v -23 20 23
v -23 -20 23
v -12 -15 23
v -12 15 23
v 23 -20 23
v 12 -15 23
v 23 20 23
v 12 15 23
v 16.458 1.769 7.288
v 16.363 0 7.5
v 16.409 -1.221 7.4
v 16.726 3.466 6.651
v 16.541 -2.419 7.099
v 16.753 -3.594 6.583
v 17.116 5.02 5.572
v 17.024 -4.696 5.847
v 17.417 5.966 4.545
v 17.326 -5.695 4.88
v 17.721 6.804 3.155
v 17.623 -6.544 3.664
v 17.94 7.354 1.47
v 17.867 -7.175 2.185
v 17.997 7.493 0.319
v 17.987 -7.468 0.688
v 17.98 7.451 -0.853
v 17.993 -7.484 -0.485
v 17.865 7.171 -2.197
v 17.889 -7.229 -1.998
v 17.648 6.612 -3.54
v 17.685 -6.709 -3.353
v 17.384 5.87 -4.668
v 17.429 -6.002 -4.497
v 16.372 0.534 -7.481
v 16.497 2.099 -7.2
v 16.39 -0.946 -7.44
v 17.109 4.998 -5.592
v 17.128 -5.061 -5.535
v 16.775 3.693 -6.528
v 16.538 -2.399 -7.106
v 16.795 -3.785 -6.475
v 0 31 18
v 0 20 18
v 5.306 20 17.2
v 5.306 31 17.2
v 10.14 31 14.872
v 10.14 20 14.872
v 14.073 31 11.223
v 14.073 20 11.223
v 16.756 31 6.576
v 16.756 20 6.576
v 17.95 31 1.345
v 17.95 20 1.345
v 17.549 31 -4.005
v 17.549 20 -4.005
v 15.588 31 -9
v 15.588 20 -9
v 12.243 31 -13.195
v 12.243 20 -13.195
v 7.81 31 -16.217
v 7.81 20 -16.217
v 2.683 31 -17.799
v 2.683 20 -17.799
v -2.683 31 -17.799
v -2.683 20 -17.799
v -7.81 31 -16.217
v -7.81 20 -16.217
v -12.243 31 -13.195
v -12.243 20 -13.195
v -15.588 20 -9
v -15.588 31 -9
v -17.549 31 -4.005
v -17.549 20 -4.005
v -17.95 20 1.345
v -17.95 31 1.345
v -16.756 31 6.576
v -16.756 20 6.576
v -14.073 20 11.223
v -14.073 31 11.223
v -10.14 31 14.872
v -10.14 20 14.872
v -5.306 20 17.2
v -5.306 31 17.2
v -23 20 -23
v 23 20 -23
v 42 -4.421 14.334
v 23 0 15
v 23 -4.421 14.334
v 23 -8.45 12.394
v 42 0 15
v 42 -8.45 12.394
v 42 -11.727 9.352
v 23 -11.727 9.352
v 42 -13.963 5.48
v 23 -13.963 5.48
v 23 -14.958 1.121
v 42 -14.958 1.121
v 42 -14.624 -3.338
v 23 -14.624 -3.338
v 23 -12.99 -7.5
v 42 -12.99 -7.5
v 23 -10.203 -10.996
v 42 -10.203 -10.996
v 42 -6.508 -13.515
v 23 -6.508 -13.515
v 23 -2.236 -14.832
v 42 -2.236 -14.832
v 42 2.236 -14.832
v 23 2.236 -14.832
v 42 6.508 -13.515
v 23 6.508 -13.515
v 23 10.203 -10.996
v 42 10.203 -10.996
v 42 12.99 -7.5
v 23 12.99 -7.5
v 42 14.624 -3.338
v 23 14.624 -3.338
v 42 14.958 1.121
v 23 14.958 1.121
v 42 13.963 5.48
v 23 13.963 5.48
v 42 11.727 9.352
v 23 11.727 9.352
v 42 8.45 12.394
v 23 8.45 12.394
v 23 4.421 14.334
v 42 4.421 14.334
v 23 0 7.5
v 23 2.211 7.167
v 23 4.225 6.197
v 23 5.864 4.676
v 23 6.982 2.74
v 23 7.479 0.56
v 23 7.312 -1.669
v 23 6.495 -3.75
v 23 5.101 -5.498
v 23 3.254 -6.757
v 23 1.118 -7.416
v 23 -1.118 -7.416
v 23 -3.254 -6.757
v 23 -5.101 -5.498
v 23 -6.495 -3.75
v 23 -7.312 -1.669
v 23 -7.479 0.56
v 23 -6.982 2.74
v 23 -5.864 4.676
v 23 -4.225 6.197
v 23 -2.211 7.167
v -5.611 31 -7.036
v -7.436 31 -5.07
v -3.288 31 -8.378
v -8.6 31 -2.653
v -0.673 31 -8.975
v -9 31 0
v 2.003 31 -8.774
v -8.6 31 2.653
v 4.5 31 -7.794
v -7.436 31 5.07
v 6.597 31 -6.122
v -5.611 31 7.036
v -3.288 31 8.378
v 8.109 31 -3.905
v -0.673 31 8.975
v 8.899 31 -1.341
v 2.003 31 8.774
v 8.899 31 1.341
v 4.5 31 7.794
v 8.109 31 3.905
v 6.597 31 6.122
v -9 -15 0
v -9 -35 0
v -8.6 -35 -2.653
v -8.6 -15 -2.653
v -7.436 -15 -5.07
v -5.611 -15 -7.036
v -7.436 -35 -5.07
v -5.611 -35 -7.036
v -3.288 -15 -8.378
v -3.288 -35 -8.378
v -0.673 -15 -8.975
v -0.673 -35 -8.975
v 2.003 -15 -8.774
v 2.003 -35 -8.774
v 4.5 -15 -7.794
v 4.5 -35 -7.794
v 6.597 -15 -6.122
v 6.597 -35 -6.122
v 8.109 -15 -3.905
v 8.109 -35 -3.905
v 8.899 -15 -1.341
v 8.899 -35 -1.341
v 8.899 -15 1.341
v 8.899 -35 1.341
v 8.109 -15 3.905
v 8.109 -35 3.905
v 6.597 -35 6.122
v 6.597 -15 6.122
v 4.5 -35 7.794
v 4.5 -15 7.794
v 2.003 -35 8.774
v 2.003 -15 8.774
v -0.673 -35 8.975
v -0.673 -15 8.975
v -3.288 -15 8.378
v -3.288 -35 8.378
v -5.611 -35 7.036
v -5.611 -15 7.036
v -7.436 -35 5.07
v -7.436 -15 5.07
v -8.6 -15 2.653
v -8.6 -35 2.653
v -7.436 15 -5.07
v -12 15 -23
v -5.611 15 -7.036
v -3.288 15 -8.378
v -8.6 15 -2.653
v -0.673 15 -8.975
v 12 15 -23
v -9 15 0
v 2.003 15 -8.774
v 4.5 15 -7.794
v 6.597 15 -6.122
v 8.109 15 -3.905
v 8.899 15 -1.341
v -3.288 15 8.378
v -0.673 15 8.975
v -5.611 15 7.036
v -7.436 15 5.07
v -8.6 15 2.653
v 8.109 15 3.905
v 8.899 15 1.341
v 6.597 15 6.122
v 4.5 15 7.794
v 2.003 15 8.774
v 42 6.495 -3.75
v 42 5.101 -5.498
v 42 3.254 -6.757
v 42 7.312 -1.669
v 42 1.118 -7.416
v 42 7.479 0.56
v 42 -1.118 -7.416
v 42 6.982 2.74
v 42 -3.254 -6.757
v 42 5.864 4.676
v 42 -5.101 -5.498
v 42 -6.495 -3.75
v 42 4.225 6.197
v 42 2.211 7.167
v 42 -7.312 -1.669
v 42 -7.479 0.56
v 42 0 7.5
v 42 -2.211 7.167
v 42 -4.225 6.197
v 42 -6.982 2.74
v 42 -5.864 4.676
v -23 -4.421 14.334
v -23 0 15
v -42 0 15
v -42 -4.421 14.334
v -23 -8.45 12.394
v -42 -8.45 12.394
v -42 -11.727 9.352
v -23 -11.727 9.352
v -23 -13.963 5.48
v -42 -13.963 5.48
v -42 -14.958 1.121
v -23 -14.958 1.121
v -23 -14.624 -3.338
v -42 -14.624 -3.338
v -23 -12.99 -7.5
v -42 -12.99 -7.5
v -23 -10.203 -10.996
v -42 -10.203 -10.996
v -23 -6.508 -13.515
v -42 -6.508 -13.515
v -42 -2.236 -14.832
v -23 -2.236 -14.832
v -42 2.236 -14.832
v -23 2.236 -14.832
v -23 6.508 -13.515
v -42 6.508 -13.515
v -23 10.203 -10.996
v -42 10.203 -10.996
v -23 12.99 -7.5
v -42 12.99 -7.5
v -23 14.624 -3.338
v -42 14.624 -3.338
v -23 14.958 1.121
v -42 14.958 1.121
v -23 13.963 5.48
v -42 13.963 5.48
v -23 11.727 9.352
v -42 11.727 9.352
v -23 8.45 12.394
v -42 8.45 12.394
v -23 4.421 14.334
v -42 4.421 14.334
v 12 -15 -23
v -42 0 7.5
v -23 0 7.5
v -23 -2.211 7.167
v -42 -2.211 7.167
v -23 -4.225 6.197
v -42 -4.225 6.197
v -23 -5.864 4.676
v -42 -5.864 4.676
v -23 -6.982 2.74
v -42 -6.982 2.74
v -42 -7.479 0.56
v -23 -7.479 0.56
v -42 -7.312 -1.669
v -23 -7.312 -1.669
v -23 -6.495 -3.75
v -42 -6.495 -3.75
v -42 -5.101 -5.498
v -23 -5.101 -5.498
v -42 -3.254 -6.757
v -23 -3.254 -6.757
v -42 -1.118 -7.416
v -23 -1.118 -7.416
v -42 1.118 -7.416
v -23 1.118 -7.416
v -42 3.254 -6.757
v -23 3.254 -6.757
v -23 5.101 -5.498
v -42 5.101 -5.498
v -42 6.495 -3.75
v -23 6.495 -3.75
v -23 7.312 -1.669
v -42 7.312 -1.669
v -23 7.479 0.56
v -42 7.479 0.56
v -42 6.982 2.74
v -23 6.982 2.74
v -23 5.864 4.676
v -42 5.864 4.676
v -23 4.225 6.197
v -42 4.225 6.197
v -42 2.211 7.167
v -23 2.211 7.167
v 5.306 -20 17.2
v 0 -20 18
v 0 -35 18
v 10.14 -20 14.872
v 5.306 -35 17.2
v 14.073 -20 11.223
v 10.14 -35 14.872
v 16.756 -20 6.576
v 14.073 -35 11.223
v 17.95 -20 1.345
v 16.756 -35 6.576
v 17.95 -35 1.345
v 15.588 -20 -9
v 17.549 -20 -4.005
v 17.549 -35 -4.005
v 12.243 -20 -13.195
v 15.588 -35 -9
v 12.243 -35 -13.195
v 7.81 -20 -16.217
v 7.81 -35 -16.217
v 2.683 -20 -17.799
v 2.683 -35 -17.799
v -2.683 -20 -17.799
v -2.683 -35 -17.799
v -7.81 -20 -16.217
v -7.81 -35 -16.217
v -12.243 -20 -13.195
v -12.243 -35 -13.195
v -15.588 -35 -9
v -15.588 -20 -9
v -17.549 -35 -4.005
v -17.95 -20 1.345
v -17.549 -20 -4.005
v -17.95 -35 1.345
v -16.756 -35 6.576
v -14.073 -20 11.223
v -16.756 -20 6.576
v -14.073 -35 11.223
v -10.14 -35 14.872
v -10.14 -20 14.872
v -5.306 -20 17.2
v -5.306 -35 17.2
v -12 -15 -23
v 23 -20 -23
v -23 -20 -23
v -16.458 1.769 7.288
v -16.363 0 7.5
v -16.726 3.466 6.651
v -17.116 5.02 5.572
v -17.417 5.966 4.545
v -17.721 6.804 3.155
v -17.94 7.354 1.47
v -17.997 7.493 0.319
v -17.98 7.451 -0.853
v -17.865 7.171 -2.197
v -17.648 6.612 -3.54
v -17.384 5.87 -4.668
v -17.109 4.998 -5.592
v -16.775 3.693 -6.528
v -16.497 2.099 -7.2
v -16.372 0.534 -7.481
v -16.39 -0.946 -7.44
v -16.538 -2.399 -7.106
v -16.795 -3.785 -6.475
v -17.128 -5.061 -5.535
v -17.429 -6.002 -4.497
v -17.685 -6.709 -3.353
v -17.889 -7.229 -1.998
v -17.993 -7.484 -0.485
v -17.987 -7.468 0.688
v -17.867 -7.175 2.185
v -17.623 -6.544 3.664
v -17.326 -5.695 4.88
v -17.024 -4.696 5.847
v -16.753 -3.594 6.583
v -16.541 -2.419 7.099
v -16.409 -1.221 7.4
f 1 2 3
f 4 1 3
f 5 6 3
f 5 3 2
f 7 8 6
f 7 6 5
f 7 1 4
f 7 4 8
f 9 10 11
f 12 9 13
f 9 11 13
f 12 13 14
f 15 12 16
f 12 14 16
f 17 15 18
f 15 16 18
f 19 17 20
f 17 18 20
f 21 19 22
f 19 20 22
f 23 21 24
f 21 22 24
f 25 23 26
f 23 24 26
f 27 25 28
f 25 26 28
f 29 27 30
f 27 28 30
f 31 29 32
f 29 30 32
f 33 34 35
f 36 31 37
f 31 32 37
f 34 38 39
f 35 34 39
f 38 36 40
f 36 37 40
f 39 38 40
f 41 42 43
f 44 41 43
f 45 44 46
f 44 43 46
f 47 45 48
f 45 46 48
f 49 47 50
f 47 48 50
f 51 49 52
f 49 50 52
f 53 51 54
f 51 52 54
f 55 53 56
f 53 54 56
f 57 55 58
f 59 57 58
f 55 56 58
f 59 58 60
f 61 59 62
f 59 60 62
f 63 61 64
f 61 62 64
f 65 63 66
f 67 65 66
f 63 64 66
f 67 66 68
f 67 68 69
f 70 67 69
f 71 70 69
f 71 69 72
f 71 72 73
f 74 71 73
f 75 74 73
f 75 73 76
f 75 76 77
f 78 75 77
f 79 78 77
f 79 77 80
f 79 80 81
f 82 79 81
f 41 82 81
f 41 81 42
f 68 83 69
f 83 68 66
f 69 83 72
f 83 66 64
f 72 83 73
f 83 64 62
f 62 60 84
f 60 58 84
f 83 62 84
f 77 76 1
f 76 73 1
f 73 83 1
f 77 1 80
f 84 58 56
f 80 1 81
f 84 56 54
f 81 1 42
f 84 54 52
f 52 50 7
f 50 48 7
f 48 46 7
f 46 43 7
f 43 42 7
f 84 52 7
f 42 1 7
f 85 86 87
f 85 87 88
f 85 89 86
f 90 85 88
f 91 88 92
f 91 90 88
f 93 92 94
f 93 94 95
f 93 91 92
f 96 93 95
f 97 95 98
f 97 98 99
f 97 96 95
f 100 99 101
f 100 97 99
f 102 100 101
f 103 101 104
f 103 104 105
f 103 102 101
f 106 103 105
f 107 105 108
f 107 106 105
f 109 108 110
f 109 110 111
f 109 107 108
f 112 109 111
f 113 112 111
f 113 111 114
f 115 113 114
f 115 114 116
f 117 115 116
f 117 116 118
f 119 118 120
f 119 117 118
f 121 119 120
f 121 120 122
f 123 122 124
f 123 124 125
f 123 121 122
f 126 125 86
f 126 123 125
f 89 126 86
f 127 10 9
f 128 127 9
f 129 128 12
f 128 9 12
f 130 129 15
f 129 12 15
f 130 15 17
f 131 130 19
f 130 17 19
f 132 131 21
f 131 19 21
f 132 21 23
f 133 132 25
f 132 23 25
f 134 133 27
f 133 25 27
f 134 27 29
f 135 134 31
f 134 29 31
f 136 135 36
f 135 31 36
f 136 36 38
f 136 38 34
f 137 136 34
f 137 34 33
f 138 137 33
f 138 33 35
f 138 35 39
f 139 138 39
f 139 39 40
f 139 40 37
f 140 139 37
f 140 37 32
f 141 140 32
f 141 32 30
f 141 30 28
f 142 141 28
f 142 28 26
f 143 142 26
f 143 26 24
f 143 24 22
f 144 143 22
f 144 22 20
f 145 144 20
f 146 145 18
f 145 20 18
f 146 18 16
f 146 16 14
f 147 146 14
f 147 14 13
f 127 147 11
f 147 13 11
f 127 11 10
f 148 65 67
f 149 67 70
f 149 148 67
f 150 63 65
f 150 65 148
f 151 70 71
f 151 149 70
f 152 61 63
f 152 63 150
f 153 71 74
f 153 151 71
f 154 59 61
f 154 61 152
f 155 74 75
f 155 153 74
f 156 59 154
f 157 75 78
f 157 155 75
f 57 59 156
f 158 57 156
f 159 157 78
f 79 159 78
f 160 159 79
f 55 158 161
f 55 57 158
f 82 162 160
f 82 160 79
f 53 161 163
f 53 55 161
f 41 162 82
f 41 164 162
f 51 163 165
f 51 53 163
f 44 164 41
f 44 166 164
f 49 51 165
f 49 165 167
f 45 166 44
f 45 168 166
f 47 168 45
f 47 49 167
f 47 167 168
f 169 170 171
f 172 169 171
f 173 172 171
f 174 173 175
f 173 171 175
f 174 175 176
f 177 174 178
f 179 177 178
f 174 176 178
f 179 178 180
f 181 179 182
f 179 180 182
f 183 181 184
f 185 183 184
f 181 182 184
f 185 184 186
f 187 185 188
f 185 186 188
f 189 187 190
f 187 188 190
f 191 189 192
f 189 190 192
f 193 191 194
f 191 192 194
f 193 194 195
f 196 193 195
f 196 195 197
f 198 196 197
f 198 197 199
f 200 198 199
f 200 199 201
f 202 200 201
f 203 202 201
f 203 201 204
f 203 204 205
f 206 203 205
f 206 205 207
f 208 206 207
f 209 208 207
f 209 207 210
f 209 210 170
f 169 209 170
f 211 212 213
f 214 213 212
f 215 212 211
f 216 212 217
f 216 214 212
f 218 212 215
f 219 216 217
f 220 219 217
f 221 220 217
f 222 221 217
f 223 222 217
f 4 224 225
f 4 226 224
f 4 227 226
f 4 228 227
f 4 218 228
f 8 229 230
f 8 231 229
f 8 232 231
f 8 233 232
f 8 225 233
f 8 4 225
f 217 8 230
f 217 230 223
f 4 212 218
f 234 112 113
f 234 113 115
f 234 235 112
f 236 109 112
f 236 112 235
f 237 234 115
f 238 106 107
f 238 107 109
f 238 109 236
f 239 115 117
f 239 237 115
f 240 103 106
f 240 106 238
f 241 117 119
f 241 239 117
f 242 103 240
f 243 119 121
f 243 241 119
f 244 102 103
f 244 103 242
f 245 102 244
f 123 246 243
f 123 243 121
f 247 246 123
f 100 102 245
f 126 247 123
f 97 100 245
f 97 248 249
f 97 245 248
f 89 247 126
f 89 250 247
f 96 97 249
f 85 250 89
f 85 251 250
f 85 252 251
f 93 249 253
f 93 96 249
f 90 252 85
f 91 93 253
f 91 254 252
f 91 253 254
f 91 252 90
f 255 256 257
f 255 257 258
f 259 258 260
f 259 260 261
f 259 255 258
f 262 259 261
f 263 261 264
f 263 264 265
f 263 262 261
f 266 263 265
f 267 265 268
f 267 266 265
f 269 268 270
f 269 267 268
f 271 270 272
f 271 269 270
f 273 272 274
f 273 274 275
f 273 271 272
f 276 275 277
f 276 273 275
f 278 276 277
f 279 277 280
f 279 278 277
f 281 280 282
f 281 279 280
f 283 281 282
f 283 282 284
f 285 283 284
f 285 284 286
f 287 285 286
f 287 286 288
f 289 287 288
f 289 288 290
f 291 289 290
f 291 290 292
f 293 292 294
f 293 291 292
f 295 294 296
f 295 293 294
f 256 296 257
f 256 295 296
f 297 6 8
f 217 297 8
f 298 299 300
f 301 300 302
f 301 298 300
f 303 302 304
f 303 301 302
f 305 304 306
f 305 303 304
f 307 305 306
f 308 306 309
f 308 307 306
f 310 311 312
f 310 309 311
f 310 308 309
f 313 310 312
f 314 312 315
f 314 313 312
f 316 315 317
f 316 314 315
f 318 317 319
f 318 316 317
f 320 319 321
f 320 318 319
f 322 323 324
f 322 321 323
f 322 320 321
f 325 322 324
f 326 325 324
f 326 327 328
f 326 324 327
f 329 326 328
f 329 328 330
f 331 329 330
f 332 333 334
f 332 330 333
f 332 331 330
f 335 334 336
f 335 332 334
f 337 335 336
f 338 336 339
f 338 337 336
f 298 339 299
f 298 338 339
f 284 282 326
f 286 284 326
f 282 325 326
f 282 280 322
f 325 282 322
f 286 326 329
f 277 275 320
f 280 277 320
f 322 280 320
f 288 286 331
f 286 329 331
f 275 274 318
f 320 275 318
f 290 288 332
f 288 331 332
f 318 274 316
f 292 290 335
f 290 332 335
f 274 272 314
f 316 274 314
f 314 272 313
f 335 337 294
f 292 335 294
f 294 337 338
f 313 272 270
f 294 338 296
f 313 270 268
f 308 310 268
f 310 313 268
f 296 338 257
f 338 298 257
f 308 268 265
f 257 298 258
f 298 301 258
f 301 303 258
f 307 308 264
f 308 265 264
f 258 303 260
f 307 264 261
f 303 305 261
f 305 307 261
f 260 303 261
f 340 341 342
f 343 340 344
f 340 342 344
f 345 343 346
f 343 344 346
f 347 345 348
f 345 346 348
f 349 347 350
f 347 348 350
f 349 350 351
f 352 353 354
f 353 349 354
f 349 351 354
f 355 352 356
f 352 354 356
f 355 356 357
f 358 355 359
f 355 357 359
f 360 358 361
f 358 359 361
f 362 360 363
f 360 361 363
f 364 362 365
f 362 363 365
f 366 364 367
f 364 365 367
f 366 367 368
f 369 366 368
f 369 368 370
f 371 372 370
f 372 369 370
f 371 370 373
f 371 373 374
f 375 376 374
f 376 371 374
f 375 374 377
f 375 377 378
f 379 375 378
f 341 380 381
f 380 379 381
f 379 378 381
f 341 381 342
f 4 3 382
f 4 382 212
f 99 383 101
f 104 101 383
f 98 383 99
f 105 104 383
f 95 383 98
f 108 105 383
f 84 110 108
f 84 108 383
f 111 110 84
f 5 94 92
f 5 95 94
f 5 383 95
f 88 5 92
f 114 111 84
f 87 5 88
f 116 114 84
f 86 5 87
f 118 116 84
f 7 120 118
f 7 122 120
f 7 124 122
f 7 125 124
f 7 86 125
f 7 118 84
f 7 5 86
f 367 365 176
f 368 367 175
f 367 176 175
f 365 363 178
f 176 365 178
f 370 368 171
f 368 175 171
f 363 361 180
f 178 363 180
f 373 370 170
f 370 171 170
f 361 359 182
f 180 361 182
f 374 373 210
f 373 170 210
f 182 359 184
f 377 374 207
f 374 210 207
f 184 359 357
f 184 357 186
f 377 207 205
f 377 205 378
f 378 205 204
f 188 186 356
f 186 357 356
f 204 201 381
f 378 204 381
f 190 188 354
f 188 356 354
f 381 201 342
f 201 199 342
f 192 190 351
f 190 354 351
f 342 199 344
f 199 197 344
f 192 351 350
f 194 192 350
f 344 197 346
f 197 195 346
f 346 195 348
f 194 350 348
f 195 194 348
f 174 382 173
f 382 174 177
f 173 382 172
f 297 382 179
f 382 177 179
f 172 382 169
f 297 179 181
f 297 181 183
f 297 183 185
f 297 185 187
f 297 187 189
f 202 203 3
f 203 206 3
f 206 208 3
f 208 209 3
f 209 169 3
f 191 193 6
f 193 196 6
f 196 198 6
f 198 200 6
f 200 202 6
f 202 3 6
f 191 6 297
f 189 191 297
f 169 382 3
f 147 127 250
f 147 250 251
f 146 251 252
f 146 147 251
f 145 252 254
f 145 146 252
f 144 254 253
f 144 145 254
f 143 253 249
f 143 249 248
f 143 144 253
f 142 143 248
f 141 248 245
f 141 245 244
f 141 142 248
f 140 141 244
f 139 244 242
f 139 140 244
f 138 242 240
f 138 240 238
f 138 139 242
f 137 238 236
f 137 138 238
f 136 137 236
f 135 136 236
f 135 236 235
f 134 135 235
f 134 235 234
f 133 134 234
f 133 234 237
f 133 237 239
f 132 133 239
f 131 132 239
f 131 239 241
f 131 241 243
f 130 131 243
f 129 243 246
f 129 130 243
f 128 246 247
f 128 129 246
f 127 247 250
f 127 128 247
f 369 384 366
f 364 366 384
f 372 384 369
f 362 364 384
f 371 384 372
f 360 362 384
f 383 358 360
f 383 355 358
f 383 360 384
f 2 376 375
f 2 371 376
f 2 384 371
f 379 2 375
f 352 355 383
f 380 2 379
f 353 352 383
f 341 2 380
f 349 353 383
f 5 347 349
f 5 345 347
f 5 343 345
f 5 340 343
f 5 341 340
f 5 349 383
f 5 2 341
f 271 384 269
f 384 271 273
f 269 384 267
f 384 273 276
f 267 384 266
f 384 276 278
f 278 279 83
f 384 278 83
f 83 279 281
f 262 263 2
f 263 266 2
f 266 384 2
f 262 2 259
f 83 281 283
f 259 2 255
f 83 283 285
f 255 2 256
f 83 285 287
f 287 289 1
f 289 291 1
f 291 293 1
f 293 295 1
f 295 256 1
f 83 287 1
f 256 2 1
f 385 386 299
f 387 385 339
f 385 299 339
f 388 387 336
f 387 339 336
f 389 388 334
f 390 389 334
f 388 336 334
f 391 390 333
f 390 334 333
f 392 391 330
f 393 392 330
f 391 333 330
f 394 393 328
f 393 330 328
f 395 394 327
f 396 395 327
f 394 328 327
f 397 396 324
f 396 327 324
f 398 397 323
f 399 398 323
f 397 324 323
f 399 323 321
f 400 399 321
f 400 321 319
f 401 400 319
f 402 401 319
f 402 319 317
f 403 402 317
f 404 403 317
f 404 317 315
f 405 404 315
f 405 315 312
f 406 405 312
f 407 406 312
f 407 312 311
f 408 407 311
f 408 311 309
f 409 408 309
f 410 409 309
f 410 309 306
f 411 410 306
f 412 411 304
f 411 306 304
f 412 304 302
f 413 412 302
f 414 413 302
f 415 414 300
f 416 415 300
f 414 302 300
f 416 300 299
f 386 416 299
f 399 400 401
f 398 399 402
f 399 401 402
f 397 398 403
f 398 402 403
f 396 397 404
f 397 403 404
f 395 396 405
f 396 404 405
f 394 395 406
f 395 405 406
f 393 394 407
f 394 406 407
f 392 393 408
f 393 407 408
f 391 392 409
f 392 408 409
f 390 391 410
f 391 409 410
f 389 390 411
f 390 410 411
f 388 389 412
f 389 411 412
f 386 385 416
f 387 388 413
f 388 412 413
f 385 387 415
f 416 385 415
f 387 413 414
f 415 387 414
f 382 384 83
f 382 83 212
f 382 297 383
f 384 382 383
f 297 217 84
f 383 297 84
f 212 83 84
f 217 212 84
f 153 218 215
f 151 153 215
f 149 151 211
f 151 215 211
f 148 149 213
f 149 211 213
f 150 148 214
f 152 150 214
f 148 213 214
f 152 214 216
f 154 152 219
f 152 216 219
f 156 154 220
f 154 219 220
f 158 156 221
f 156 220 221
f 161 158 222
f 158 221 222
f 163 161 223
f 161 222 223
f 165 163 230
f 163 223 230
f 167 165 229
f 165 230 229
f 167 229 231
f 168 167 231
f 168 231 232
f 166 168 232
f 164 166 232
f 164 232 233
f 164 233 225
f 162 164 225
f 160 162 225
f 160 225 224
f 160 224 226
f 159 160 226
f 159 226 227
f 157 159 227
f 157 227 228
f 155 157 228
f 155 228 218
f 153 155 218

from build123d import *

# Parameters (mm, degrees)
SKETCH1_R                = 15
SKETCH1_R_2              = 7.5
BOSS_EXTRUDE1_DEPTH      = 42
SKETCH2_W                = 46
SKETCH2_H                = 40
BOSS_EXTRUDE2_DEPTH      = 23
SKETCH3_W                = 24
SKETCH3_H                = 30
CUT_EXTRUDE1_DEPTH       = 66.421708935
HOLE1_D                  = 15
BOSS_EXTRUDE3_DEPTH      = 11
BOSS_EXTRUDE3_DEPTH_BACK = 55
SKETCH6_R                = 18
SKETCH7_W                = 24
SKETCH7_H                = 30
CUT_EXTRUDE2_DEPTH       = 72.449282712
HOLE2_D                  = 18


with BuildPart() as part:
    # Sketch1 → Boss-Extrude1 (new, symmetric)
    with BuildSketch(Plane(origin=(0, 0, 0), x_dir=(0, 0, -1), z_dir=(1, 0, 0))):
        with Locations(Location((0, 0, 0), (0, 0, 180))):
            Circle(SKETCH1_R)
        with Locations(Location((0, 0, 0), (0, 0, 180))):
            Circle(SKETCH1_R_2, mode=Mode.SUBTRACT)
    extrude(amount=BOSS_EXTRUDE1_DEPTH, both=True)

    # Sketch2 → Boss-Extrude2 (add, symmetric)
    with BuildSketch(Plane.XY):
        Rectangle(SKETCH2_W, SKETCH2_H)
    extrude(amount=BOSS_EXTRUDE2_DEPTH, both=True)

    # Sketch3 → Cut-Extrude1 (cut, through all)
    with BuildSketch(Plane.XY.offset(23)):
        Rectangle(SKETCH3_W, SKETCH3_H)
    extrude(amount=-CUT_EXTRUDE1_DEPTH, mode=Mode.SUBTRACT)

    # Hole1 (through all)
    with Locations(Plane(origin=(42, 0, 0), x_dir=(0, 0, -1), z_dir=(1, 0, 0))):
        with Locations((0, 0)):
            Hole(HOLE1_D / 2)

    # Sketch6 → Boss-Extrude3 (add, two sides: drawn at the far end of the back side and taken through both)
    with BuildSketch(Plane(origin=(0, 20, 0), x_dir=(1, 0, 0), z_dir=(0, 1, 0)).offset(-BOSS_EXTRUDE3_DEPTH_BACK)):
        with Locations(Location((0, 0, 0), (0, 0, 270))):
            Circle(SKETCH6_R)
    extrude(amount=BOSS_EXTRUDE3_DEPTH + BOSS_EXTRUDE3_DEPTH_BACK)

    # Sketch7 → Cut-Extrude2 (cut, through all)
    with BuildSketch(Plane.XY.offset(23)):
        Rectangle(SKETCH7_W, SKETCH7_H)
    extrude(amount=-CUT_EXTRUDE2_DEPTH, mode=Mode.SUBTRACT)

    # Hole2 (through all)
    with Locations(Plane(origin=(0, 31, 0), x_dir=(1, 0, 0), z_dir=(0, 1, 0))):
        with Locations((0, 0)):
            Hole(HOLE2_D / 2)


solid = part.part
